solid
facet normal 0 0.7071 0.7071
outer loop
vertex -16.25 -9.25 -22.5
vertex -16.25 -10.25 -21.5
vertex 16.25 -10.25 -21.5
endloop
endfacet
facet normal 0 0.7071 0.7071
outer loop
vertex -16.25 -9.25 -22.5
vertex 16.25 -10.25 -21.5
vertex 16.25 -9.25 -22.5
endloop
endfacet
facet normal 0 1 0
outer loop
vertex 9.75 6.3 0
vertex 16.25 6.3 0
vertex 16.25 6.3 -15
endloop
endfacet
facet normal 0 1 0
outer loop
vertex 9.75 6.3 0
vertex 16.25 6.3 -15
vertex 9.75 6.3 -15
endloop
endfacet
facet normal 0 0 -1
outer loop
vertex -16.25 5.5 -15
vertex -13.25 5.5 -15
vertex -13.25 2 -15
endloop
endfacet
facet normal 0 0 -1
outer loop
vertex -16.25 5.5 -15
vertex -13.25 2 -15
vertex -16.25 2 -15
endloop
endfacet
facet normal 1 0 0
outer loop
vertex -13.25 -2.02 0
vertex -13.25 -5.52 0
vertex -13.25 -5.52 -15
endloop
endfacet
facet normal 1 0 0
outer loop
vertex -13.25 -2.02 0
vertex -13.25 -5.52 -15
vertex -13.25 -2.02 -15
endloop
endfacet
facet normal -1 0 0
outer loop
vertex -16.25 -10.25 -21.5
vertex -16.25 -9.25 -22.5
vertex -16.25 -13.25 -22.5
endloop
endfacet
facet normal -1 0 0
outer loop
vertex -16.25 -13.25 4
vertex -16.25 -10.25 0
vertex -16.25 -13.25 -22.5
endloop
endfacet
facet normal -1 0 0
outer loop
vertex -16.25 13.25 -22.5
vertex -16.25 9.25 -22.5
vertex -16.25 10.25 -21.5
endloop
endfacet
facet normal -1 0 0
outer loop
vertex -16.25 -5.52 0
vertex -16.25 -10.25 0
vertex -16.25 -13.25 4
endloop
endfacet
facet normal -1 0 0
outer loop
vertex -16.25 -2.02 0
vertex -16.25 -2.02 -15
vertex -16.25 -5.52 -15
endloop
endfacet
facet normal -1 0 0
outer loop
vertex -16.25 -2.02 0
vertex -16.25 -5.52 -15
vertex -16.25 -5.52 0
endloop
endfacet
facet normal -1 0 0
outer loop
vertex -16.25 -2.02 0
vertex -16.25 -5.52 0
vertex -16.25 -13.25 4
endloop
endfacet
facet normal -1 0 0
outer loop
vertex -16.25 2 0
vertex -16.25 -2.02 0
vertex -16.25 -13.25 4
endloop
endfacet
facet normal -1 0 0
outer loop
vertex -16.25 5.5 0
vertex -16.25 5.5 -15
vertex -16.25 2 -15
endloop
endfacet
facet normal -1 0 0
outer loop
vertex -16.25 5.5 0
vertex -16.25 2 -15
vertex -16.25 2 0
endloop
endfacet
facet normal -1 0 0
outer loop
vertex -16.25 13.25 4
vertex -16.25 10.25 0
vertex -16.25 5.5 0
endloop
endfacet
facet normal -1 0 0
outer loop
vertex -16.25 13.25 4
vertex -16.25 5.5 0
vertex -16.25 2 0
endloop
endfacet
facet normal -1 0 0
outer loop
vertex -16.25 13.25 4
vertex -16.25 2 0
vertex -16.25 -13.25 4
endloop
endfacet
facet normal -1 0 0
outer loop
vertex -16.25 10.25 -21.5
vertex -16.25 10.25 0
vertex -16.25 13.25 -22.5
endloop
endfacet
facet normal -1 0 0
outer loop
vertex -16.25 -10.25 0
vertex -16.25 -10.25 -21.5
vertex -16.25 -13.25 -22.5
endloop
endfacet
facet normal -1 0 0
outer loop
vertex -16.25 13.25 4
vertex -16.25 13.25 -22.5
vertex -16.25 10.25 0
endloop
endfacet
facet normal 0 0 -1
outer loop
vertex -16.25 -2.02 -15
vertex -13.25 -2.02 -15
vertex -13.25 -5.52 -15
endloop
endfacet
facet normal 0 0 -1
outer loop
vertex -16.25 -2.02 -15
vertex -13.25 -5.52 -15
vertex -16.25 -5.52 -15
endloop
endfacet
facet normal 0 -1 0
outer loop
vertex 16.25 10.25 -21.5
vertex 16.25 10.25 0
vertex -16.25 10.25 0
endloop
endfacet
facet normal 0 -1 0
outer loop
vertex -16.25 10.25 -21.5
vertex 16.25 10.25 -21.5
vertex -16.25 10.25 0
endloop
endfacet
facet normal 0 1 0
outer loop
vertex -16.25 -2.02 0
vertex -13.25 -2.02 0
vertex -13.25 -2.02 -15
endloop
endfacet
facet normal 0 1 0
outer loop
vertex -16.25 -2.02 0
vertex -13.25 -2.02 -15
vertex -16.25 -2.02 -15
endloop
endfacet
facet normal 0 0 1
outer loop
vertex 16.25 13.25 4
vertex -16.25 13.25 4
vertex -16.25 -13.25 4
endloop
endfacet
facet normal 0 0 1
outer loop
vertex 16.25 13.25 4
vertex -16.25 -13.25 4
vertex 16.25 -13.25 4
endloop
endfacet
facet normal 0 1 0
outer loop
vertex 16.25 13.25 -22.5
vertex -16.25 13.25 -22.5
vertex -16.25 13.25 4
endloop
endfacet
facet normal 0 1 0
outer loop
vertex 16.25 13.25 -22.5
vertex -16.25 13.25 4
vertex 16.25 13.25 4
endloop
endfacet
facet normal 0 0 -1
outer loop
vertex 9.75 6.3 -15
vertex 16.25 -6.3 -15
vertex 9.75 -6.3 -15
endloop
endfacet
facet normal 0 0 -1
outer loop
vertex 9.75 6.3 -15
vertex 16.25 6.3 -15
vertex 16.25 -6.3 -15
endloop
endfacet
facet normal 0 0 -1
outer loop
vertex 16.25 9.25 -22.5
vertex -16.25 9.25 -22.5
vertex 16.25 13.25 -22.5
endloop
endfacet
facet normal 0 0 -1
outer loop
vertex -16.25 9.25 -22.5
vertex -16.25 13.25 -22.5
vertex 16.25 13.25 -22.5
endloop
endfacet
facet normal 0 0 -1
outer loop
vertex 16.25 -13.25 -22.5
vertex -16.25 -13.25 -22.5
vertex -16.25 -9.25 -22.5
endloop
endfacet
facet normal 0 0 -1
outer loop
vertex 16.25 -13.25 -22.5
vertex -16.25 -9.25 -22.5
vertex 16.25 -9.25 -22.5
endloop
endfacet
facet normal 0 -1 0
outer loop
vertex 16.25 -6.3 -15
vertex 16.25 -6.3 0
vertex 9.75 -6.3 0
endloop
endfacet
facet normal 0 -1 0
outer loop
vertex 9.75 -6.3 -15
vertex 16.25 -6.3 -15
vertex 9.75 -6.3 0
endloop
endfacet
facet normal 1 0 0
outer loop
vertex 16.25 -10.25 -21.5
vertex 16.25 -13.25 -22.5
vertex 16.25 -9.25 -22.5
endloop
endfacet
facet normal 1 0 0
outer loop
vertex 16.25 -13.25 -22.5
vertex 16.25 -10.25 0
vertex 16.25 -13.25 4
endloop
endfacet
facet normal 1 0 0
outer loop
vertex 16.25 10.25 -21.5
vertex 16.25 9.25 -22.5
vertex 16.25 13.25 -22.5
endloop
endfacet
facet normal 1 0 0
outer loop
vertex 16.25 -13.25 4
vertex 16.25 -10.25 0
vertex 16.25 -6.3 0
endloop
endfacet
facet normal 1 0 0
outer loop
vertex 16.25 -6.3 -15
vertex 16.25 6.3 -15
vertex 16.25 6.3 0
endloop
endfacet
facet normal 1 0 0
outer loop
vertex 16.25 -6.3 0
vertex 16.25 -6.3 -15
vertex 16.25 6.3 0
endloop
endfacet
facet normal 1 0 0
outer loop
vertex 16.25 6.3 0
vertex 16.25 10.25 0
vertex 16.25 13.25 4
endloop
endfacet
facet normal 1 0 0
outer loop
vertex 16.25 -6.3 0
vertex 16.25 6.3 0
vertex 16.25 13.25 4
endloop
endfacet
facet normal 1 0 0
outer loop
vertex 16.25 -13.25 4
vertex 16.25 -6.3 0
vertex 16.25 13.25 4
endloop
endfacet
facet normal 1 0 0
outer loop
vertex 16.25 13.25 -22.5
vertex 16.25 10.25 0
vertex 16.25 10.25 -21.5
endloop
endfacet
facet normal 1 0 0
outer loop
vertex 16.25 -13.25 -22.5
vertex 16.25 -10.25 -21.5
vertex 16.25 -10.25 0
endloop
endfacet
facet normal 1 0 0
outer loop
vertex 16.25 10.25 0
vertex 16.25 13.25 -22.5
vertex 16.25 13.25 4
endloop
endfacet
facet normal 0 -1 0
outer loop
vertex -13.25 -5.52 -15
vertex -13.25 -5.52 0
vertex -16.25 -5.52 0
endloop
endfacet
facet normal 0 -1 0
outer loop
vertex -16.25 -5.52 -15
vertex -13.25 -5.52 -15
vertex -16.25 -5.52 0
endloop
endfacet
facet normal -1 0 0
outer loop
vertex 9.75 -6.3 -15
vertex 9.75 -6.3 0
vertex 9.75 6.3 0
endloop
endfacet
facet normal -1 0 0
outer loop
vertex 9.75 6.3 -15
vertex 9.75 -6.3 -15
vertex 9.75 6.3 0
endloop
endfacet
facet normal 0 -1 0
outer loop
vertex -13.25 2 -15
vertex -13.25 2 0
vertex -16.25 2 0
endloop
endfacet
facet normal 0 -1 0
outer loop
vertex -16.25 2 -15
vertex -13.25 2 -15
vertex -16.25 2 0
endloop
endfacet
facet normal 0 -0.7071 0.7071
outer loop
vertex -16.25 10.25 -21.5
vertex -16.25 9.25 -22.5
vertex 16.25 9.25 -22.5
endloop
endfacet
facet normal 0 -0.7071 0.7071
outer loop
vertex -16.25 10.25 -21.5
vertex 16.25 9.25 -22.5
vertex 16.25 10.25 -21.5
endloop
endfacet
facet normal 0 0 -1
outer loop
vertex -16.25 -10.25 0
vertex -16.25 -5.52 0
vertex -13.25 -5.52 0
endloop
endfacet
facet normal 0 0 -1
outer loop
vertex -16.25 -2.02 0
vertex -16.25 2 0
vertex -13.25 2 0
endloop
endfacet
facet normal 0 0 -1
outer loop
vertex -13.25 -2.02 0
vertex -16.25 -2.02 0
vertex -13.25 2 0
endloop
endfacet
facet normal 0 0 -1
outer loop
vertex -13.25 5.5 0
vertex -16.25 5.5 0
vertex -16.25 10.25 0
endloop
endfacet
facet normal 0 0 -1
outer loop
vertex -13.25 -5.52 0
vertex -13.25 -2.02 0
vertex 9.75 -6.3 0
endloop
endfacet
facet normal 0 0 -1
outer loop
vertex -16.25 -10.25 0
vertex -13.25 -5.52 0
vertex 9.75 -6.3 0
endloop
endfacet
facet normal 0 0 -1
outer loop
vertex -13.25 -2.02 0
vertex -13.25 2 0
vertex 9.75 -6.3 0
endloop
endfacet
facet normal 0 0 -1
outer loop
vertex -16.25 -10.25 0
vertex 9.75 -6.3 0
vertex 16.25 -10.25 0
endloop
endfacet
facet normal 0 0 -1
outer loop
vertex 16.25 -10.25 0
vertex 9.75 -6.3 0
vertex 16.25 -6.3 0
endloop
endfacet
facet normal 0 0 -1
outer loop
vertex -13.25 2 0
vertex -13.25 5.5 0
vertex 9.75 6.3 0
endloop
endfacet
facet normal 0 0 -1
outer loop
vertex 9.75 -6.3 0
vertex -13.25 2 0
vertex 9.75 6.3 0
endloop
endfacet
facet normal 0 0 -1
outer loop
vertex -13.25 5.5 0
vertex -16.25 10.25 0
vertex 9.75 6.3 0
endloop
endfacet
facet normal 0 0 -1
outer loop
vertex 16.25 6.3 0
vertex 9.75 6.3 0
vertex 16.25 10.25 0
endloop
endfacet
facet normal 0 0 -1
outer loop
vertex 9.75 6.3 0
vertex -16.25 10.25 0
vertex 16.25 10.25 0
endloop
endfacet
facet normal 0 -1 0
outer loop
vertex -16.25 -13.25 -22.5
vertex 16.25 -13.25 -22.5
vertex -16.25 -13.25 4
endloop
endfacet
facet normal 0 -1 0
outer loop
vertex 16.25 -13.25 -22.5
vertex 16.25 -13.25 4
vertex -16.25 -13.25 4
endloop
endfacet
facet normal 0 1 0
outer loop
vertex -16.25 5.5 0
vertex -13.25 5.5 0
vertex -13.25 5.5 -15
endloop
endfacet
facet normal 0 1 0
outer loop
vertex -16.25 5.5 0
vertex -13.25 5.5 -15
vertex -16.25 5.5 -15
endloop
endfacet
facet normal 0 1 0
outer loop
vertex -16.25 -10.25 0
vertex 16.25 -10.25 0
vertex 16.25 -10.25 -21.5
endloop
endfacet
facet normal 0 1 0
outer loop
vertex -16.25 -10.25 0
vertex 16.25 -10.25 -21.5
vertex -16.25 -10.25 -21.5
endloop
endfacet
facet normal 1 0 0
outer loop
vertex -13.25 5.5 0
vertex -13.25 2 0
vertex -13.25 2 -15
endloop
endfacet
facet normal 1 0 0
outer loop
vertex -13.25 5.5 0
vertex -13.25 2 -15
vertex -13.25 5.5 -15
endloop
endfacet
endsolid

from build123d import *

# Parameters (mm, degrees)
SKETCH1_W           = 32.5
SKETCH1_H           = 26.5
BOSS_EXTRUDE1_DEPTH = 4
SKETCH2_W           = 6.5
SKETCH2_H           = 6.3
BOSS_EXTRUDE2_DEPTH = 15
SKETCH3_W           = 32.5
SKETCH3_H           = 3
BOSS_EXTRUDE3_DEPTH = 22.5
SKETCH4_W           = 32.5
SKETCH4_H           = 1
BOSS_EXTRUDE4_DEPTH = 1
CUT_EXTRUDE1_DEPTH  = 33.5
SKETCH6_W           = 32.5
SKETCH6_H           = 1
BOSS_EXTRUDE5_DEPTH = 1
CUT_EXTRUDE2_DEPTH  = 33.5
SKETCH8_W           = 3
SKETCH8_H           = 3.5
BOSS_EXTRUDE6_DEPTH = 15


with BuildPart() as part:
    # Sketch1 → Boss-Extrude1 (new body)
    with BuildSketch(Plane.XY):
        Rectangle(SKETCH1_W, SKETCH1_H)
    extrude(amount=BOSS_EXTRUDE1_DEPTH)

    # Sketch2 → Boss-Extrude2 (add)
    with BuildSketch(Plane(origin=(0, 0, 0), x_dir=(-1, 0, 0), z_dir=(0, 0, -1))):
        with Locations((-13, -3.15)):
            Rectangle(SKETCH2_W, SKETCH2_H)
        with Locations((-13, 3.15)):
            Rectangle(SKETCH2_W, SKETCH2_H)
    extrude(amount=BOSS_EXTRUDE2_DEPTH)

    # Sketch3 → Boss-Extrude3 (add)
    with BuildSketch(Plane(origin=(0, 0, 0), x_dir=(-1, 0, 0), z_dir=(0, 0, -1))):
        with Locations((0, -11.75)):
            Rectangle(SKETCH3_W, SKETCH3_H)
        with Locations((0, 11.75)):
            Rectangle(SKETCH3_W, SKETCH3_H)
    extrude(amount=BOSS_EXTRUDE3_DEPTH)

    # Sketch4 → Boss-Extrude4 (add)
    with BuildSketch(Plane(origin=(0, -10.25, 0), x_dir=(1, 0, 0), z_dir=(0, 1, 0))):
        with Locations((0, 22)):
            Rectangle(SKETCH4_W, SKETCH4_H)
    extrude(amount=BOSS_EXTRUDE4_DEPTH)

    # Sketch5 → Cut-Extrude1 (cut, through all)
    with BuildSketch(Plane.ZY.offset(16.25)):
        Polygon((-21.5, -10.25), (-22.5, -9.25), (-21.5, -9.25), align=None)
    extrude(amount=-CUT_EXTRUDE1_DEPTH, mode=Mode.SUBTRACT)

    # Sketch6 → Boss-Extrude5 (add)
    with BuildSketch(Plane.XZ.offset(-10.25)):
        with Locations((0, -22)):
            Rectangle(SKETCH6_W, SKETCH6_H)
    extrude(amount=BOSS_EXTRUDE5_DEPTH)

    # Sketch7 → Cut-Extrude2 (cut, through all)
    with BuildSketch(Plane.ZY.offset(16.25)):
        Polygon((-21.5, 10.25), (-21.5, 9.25), (-22.5, 9.25), align=None)
    extrude(amount=-CUT_EXTRUDE2_DEPTH, mode=Mode.SUBTRACT)

    # Sketch8 → Boss-Extrude6 (add)
    with BuildSketch(Plane(origin=(0, 0, 0), x_dir=(-1, 0, 0), z_dir=(0, 0, -1))):
        with Locations((14.75, 3.75)):
            Rectangle(SKETCH8_W, SKETCH8_H)
        with Locations((14.75, -3.76990678)):
            Rectangle(SKETCH8_W, SKETCH8_H)
    extrude(amount=BOSS_EXTRUDE6_DEPTH)


solid = part.part
